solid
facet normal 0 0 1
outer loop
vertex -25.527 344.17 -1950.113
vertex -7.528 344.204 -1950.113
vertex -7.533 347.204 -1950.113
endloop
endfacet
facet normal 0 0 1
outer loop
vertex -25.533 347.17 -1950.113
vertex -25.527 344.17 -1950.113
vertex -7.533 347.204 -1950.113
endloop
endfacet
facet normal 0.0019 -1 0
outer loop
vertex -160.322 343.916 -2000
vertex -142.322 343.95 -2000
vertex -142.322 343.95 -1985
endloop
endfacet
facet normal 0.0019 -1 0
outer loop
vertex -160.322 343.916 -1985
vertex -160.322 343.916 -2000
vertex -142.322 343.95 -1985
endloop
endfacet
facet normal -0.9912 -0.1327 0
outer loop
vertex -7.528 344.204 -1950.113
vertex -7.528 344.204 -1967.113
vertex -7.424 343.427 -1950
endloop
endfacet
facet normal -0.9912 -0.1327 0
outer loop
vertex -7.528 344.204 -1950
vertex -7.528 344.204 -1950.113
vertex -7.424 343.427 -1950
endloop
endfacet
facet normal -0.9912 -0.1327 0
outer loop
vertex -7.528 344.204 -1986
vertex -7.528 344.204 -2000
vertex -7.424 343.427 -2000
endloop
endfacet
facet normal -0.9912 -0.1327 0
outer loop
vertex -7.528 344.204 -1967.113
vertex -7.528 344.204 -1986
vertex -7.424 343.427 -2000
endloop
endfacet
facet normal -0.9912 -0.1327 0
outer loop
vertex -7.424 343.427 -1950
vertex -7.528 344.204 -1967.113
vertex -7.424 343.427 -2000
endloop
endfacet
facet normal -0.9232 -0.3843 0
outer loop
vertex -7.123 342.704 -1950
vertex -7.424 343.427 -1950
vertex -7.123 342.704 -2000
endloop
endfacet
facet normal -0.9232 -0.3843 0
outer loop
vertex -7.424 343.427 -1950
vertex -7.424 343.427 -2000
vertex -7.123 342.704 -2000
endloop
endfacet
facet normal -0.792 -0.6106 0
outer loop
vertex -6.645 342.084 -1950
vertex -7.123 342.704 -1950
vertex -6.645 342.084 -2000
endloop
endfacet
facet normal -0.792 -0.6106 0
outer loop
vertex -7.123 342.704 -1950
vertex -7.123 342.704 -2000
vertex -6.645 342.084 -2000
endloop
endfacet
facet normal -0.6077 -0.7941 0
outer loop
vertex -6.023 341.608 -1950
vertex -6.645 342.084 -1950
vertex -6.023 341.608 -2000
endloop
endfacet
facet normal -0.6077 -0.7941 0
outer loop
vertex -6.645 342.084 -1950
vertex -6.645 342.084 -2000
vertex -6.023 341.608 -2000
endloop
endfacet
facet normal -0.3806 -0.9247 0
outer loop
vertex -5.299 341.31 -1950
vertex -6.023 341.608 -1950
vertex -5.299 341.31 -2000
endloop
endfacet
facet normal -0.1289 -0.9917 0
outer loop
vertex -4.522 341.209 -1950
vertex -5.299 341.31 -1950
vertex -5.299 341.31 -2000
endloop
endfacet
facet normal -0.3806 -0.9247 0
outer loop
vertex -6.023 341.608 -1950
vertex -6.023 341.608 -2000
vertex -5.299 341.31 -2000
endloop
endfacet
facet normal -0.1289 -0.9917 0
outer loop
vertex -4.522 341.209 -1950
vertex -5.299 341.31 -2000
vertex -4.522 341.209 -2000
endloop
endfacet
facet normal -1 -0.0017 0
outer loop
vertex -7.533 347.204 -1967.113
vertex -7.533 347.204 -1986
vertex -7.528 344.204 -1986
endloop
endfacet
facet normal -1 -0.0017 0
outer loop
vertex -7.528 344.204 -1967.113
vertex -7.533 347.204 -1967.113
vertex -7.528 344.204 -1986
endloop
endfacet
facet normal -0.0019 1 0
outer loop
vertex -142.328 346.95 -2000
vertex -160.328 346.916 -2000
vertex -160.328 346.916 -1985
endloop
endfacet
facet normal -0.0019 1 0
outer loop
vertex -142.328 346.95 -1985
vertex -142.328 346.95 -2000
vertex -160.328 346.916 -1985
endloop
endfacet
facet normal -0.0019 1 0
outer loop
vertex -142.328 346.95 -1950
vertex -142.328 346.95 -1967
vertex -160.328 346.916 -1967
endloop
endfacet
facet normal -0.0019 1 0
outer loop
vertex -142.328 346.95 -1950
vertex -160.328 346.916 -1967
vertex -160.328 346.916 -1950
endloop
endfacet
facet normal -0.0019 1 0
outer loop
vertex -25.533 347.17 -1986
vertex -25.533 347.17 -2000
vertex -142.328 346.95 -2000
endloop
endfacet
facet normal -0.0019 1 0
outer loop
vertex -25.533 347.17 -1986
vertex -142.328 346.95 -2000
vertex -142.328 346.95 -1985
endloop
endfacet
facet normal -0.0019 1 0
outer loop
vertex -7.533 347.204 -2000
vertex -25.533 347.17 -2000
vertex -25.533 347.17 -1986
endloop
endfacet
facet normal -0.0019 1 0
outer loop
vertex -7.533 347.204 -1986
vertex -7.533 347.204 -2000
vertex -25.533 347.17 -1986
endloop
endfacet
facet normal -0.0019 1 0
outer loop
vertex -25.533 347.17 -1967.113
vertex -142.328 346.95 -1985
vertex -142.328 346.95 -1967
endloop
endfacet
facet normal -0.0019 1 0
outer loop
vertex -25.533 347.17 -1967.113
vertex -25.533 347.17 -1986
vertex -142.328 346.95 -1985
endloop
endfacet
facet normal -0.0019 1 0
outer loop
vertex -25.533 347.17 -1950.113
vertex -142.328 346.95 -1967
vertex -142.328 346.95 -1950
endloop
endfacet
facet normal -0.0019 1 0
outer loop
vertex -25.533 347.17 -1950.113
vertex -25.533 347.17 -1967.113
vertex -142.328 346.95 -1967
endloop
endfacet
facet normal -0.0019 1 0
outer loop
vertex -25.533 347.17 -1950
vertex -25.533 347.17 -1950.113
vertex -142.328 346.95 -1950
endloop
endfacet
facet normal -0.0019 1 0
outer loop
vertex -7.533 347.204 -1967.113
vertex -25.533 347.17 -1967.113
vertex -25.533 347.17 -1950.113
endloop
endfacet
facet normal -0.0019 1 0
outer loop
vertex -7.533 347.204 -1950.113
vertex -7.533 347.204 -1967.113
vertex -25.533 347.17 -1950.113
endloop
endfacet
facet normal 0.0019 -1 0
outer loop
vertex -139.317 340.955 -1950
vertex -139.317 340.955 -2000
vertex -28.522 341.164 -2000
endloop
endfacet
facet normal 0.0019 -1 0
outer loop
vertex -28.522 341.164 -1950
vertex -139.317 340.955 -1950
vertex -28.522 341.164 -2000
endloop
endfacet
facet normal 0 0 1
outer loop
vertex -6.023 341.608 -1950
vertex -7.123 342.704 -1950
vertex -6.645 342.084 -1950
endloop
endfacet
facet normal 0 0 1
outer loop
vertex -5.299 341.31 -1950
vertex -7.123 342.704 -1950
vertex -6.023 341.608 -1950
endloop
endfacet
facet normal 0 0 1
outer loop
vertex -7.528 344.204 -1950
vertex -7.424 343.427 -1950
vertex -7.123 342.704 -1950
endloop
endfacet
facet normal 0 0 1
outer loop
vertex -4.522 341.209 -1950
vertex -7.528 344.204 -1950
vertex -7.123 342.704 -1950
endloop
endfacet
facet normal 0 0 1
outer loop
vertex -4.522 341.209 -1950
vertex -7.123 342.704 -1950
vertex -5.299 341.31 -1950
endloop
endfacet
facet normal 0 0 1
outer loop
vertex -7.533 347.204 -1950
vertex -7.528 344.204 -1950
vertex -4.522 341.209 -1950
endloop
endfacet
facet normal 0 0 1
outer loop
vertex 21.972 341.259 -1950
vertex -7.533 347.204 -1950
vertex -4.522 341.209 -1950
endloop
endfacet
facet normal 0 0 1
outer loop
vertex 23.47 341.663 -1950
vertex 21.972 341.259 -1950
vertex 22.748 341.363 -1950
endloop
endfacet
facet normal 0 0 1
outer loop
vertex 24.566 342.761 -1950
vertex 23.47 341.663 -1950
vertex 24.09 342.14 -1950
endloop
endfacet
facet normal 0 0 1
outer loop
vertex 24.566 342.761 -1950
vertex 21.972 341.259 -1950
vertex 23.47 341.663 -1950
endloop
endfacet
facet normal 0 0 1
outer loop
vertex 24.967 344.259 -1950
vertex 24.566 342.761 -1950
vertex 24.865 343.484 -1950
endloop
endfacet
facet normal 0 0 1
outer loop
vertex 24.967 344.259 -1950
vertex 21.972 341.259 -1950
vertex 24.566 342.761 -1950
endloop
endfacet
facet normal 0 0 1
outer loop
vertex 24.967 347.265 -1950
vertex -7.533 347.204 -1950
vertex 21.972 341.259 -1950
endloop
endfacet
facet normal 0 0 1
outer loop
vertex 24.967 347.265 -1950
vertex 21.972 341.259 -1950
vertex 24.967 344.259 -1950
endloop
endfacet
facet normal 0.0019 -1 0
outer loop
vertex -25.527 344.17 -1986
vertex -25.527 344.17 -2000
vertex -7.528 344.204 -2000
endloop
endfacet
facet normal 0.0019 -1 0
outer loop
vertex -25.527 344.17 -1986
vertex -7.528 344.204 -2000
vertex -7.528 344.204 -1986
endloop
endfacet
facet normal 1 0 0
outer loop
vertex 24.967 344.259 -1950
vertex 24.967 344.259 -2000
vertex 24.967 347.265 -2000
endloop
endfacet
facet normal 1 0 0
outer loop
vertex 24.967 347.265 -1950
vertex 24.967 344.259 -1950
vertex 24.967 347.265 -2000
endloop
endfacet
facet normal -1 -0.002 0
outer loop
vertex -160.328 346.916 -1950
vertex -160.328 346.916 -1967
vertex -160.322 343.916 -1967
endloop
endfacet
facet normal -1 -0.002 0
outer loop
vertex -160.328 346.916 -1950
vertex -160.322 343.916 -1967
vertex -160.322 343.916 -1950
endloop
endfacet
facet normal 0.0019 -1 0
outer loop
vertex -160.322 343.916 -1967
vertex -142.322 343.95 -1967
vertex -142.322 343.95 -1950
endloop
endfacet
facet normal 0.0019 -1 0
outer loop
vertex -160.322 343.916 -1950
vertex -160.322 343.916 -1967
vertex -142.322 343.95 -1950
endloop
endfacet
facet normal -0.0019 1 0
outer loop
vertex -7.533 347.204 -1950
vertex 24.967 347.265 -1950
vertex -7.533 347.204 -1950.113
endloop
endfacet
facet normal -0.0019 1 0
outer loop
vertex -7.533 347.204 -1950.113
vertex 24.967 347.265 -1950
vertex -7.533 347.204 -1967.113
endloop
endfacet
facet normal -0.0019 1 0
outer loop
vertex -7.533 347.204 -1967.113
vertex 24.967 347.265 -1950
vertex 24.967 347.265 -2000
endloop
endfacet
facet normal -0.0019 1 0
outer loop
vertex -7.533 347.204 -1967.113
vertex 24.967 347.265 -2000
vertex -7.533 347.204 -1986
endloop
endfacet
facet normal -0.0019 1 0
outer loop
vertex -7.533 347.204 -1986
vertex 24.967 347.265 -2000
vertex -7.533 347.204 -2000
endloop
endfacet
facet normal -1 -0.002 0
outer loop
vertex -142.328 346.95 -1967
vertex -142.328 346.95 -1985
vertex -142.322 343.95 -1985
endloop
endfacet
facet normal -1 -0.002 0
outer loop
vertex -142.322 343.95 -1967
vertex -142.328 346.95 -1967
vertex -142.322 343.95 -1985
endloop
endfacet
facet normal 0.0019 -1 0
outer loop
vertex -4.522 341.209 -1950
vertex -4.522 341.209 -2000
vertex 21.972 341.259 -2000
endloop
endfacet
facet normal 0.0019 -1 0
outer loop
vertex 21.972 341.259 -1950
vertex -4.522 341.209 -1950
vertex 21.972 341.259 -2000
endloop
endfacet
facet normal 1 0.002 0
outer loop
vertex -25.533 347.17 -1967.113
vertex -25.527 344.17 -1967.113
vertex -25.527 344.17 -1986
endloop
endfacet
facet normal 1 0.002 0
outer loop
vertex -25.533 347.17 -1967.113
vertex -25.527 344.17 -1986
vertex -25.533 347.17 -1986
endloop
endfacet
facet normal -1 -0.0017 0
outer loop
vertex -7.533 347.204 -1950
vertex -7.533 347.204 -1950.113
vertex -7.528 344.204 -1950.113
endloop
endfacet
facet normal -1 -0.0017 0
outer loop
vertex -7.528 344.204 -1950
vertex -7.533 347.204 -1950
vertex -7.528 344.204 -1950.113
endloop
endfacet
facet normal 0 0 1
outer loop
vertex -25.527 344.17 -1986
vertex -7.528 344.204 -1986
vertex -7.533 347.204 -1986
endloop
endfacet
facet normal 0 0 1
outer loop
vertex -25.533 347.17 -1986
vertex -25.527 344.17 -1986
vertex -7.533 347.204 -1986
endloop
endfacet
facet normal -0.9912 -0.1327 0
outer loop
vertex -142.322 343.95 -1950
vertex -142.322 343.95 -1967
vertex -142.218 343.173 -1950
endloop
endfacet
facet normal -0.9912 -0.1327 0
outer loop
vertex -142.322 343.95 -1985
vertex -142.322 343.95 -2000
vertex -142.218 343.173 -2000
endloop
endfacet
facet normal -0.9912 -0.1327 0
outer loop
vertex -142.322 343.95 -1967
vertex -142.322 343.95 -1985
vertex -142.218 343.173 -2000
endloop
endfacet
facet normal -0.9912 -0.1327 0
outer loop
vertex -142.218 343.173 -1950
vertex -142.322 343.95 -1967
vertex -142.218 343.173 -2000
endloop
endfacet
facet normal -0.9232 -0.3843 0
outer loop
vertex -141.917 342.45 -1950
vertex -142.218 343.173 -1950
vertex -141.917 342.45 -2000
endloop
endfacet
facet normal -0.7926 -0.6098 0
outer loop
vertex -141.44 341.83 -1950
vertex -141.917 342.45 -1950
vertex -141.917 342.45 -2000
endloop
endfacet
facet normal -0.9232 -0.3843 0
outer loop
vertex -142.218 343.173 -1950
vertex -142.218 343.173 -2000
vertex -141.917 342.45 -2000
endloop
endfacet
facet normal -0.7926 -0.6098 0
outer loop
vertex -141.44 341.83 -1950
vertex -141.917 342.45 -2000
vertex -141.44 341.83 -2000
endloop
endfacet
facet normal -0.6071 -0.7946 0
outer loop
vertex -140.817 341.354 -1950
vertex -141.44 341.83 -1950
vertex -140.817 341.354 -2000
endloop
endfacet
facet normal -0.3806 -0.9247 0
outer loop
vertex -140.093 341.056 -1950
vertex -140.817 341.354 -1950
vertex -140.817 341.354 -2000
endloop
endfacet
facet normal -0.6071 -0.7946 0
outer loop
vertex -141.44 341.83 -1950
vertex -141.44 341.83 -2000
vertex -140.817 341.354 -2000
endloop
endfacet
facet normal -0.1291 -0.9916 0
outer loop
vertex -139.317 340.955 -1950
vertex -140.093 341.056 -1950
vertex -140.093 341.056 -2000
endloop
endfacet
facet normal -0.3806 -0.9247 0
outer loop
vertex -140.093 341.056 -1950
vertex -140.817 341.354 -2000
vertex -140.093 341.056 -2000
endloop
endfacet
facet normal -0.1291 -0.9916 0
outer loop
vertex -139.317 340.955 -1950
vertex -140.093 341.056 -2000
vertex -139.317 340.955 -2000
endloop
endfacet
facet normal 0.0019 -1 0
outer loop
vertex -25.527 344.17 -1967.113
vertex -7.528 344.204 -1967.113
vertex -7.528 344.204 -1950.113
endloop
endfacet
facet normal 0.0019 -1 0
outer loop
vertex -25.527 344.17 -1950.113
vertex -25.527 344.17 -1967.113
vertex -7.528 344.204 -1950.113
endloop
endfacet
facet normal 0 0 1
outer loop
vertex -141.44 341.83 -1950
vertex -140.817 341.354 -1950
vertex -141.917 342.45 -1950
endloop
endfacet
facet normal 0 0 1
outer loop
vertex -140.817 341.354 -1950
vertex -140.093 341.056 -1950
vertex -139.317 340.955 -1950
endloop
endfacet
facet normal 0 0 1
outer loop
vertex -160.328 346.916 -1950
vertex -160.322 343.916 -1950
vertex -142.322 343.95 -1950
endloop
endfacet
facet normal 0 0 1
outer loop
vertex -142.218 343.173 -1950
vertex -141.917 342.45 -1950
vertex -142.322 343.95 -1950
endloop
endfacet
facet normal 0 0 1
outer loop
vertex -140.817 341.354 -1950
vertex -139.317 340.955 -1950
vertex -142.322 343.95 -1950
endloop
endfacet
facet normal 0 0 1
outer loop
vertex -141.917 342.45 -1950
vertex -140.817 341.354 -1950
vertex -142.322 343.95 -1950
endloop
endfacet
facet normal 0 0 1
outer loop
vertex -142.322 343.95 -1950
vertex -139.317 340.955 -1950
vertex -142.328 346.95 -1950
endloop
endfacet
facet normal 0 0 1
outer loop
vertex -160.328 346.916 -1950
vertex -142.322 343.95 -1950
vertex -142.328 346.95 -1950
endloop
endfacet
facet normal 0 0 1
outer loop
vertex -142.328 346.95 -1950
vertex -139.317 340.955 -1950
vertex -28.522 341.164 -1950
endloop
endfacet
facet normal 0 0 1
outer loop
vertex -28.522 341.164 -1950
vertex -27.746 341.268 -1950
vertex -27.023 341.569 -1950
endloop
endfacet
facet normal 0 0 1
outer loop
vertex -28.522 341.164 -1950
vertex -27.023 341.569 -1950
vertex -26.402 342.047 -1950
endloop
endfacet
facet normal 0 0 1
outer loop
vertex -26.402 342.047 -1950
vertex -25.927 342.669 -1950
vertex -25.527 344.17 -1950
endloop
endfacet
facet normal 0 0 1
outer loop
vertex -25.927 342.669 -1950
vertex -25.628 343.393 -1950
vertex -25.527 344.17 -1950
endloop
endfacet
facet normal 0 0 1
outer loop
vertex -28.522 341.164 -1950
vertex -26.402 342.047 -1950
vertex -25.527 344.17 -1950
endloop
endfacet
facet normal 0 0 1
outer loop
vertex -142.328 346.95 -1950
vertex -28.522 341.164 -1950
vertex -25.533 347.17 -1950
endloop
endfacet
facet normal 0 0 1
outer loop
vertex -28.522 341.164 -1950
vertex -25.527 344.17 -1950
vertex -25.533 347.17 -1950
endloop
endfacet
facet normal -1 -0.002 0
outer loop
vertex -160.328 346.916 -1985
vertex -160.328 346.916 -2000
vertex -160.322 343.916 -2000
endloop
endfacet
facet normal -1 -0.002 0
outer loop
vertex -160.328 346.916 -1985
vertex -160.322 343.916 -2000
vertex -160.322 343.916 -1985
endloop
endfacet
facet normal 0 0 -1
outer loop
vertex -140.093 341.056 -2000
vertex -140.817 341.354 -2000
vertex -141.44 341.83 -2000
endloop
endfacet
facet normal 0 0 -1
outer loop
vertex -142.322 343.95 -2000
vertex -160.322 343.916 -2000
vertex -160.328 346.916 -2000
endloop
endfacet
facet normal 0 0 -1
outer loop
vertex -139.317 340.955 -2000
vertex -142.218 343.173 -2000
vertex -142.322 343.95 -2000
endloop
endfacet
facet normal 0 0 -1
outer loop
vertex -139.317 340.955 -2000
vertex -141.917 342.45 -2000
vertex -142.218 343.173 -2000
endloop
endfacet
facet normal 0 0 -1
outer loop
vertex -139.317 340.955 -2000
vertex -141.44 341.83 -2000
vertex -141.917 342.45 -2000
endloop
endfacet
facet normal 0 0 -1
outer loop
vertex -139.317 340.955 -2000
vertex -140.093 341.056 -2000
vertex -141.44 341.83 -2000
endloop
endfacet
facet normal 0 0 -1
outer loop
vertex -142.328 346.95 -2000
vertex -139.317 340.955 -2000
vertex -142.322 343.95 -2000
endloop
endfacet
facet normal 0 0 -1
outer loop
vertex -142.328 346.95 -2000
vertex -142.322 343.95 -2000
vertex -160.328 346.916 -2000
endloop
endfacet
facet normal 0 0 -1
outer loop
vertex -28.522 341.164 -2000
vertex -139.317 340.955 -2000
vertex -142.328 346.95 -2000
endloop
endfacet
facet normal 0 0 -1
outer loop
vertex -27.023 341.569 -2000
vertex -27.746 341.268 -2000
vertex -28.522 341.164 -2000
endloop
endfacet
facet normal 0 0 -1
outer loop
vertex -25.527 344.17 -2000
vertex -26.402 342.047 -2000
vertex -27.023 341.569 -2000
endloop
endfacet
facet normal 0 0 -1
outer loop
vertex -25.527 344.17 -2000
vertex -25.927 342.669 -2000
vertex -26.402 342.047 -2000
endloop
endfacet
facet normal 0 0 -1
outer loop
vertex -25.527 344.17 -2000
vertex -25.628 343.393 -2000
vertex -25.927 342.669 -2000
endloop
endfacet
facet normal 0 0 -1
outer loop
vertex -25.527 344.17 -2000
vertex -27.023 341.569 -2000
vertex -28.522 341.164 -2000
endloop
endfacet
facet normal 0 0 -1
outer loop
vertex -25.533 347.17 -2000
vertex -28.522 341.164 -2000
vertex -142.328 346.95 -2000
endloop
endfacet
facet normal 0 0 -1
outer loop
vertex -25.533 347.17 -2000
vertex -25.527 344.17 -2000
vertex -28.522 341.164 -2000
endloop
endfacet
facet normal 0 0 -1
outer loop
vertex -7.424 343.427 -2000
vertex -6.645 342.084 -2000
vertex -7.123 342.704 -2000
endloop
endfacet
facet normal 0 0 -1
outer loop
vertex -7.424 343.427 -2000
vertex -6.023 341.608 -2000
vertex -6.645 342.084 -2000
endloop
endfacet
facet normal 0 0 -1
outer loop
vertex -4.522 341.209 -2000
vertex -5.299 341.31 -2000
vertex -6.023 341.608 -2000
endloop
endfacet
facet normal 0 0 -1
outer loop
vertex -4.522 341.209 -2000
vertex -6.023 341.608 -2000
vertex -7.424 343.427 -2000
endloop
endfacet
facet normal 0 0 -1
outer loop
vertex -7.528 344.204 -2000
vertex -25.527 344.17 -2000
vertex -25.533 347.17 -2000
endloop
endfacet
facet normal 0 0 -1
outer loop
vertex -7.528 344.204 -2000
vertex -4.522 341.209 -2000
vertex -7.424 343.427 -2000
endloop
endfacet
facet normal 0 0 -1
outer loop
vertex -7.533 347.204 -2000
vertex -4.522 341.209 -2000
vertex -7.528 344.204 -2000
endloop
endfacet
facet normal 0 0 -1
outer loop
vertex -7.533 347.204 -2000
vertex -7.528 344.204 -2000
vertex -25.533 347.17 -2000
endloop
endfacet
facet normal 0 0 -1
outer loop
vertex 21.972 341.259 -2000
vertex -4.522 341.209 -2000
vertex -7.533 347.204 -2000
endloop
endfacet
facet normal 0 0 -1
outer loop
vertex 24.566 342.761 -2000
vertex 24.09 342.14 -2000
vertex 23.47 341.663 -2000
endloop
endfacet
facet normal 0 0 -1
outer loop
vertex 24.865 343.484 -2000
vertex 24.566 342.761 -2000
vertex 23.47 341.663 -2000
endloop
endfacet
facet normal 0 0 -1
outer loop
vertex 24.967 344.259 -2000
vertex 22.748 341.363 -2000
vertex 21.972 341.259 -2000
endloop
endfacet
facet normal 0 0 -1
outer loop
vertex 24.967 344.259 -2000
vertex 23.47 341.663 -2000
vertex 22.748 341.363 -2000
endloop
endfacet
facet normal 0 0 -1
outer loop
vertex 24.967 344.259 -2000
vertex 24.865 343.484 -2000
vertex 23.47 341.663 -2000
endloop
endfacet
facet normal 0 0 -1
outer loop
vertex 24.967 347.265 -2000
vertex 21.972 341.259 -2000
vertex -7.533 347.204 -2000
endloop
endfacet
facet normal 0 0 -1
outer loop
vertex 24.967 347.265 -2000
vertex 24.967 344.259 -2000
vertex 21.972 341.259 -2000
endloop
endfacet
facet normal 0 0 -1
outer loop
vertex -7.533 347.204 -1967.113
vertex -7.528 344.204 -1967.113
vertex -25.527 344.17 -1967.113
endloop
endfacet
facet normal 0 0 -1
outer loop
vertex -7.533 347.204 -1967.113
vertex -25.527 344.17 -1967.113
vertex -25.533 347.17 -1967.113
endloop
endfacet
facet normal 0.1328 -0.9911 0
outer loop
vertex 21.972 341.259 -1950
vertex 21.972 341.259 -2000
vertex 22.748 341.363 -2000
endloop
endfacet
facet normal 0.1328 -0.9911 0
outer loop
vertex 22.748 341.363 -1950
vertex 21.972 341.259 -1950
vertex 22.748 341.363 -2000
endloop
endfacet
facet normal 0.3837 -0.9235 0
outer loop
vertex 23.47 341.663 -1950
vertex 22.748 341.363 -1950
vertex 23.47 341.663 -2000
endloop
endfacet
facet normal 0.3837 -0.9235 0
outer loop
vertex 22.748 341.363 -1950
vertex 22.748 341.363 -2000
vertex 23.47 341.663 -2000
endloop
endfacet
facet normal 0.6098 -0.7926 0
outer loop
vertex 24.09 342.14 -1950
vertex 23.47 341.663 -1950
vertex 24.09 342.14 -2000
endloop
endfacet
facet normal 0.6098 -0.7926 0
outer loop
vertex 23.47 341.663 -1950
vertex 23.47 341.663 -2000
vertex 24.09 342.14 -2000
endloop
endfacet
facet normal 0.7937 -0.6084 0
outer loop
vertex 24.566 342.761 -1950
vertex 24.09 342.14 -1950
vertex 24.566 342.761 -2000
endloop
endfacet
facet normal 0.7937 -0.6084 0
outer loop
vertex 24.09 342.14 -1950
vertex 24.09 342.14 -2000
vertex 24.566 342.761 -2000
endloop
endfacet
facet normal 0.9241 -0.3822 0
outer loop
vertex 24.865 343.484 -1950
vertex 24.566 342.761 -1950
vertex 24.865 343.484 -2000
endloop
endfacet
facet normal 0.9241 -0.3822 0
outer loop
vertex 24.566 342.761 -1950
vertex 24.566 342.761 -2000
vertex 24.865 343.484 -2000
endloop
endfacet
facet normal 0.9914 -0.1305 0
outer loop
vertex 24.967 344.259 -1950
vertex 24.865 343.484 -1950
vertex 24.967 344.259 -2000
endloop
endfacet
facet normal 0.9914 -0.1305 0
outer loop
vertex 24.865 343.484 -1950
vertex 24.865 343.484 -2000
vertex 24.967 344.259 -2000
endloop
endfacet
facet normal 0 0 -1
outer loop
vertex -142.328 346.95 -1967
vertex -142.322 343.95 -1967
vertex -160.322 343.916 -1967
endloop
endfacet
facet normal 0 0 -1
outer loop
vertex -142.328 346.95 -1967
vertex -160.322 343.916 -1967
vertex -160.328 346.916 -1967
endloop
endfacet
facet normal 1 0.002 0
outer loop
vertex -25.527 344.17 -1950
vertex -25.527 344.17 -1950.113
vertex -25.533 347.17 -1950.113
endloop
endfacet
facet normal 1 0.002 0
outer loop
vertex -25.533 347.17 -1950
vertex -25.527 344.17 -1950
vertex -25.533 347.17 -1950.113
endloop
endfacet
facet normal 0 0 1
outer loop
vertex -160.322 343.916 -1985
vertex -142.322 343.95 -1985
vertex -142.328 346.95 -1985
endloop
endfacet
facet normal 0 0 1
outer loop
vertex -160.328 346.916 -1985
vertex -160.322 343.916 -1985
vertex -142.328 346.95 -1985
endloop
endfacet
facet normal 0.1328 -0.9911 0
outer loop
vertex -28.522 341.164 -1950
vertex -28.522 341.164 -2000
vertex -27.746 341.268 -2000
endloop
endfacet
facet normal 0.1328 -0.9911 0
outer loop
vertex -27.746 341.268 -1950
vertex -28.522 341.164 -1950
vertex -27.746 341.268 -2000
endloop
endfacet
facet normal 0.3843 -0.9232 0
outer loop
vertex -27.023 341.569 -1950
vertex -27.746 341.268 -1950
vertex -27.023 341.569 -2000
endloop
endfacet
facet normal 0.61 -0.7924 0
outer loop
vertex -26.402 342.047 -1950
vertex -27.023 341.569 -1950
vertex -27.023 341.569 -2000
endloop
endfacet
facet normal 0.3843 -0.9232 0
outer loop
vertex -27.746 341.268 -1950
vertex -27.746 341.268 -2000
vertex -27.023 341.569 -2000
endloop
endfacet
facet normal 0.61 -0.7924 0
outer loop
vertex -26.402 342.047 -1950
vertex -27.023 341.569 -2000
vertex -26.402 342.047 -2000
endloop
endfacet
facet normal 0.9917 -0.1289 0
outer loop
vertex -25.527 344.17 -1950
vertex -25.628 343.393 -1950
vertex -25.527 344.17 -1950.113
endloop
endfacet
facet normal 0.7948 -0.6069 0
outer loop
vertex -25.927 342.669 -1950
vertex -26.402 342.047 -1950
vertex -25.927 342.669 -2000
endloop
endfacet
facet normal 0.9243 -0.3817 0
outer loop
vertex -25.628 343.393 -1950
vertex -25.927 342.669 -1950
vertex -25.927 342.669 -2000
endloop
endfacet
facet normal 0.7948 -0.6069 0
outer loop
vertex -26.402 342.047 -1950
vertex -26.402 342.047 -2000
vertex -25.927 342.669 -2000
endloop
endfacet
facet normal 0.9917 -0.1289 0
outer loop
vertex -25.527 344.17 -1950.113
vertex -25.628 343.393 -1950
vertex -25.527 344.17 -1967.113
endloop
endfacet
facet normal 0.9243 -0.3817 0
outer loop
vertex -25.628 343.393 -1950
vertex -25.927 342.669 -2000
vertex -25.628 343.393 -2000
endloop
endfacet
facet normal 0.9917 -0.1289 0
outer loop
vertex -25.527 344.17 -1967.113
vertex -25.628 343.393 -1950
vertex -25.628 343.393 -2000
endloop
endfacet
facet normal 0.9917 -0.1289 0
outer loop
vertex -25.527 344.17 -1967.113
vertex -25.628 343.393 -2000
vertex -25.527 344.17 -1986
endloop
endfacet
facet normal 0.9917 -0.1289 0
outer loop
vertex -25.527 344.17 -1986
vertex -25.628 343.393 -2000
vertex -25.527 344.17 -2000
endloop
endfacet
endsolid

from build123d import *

# Parameters (mm, degrees)
BOSS_EXTRUDE4_DEPTH   = 50
BOSS_EXTRUDE4_2_DEPTH = 50
SKETCH7_W             = 17
SKETCH7_H             = 3
SKETCH7_W_2           = 14
BOSS_EXTRUDE5_DEPTH   = 18
SKETCH8_W             = 17
SKETCH8_H             = 3
SKETCH8_W_2           = 15
BOSS_EXTRUDE6_DEPTH   = 18


with BuildPart() as part:
    # Sketch6 → Boss-Extrude4 (new body)
    with BuildSketch(Plane.XY.offset(-2000)):
        with BuildLine():
            Line((24.966787002, 344.25912611), (24.966787002, 347.264784988))
            Line((24.966787002, 347.264784988), (-7.533155287, 347.203538294))
            Line((-7.533155287, 347.203538294), (-7.527501746, 344.203543621))
            ThreePointArc((-7.527501746, 344.203543621), (-6.644825993, 342.083882928), (-4.521853532, 341.209202489))
            Line((-4.521853532, 341.209202489), (21.972440543, 341.259131437))
            ThreePointArc((21.972440543, 341.259131437), (24.090105234, 342.139805537), (24.966787002, 344.25912611))
        make_face()
    extrude(amount=BOSS_EXTRUDE4_DEPTH)



with BuildPart() as body_2:
    # Sketch6 → Boss-Extrude4 2 (new body)
    with BuildSketch(Plane.XY.offset(-2000)):
        with BuildLine():
            Line((-25.527469784, 344.169622375), (-25.533123325, 347.169617048))
            Line((-25.533123325, 347.169617048), (-142.327839016, 346.949515419))
            Line((-142.327839016, 346.949515419), (-142.322185475, 343.949520746))
            ThreePointArc((-142.322185475, 343.949520746), (-141.439509722, 341.829860053), (-139.316537261, 340.955179614))
            Line((-139.316537261, 340.955179614), (-28.521810916, 341.163974161))
            ThreePointArc((-28.521810916, 341.163974161), (-26.402150223, 342.046649914), (-25.527469784, 344.169622375))
        make_face()
    extrude(amount=BOSS_EXTRUDE4_2_DEPTH)


with BuildPart() as part_1:
    add(part.part)

    add(body_2.part)  # Boss-Extrude5 merges body 2
    # Sketch7 → Boss-Extrude5 (add)
    with BuildSketch(Plane(origin=(-6.878819882, -0.012963253, 0), x_dir=(0, 0, 1), z_dir=(-0.9999982243025385, -0.001884513669318331, 0))):
        with Locations((-1958.612984199, 345.717118099)):
            Rectangle(SKETCH7_W, SKETCH7_H)
        with Locations((-1993, 345.717118099)):
            Rectangle(SKETCH7_W_2, SKETCH7_H)
    extrude(amount=BOSS_EXTRUDE5_DEPTH)

    # Sketch8 → Boss-Extrude6 (add)
    with BuildSketch(Plane(origin=(-141.673503611, -0.266986128, 0), x_dir=(0, 0, 1), z_dir=(-0.9999982243025385, -0.001884513669318331, 0))):
        with Locations((-1958.5, 345.717118099)):
            Rectangle(SKETCH8_W, SKETCH8_H)
        with Locations((-1992.5, 345.717118099)):
            Rectangle(SKETCH8_W_2, SKETCH8_H)
    extrude(amount=BOSS_EXTRUDE6_DEPTH)


solid = part_1.part
